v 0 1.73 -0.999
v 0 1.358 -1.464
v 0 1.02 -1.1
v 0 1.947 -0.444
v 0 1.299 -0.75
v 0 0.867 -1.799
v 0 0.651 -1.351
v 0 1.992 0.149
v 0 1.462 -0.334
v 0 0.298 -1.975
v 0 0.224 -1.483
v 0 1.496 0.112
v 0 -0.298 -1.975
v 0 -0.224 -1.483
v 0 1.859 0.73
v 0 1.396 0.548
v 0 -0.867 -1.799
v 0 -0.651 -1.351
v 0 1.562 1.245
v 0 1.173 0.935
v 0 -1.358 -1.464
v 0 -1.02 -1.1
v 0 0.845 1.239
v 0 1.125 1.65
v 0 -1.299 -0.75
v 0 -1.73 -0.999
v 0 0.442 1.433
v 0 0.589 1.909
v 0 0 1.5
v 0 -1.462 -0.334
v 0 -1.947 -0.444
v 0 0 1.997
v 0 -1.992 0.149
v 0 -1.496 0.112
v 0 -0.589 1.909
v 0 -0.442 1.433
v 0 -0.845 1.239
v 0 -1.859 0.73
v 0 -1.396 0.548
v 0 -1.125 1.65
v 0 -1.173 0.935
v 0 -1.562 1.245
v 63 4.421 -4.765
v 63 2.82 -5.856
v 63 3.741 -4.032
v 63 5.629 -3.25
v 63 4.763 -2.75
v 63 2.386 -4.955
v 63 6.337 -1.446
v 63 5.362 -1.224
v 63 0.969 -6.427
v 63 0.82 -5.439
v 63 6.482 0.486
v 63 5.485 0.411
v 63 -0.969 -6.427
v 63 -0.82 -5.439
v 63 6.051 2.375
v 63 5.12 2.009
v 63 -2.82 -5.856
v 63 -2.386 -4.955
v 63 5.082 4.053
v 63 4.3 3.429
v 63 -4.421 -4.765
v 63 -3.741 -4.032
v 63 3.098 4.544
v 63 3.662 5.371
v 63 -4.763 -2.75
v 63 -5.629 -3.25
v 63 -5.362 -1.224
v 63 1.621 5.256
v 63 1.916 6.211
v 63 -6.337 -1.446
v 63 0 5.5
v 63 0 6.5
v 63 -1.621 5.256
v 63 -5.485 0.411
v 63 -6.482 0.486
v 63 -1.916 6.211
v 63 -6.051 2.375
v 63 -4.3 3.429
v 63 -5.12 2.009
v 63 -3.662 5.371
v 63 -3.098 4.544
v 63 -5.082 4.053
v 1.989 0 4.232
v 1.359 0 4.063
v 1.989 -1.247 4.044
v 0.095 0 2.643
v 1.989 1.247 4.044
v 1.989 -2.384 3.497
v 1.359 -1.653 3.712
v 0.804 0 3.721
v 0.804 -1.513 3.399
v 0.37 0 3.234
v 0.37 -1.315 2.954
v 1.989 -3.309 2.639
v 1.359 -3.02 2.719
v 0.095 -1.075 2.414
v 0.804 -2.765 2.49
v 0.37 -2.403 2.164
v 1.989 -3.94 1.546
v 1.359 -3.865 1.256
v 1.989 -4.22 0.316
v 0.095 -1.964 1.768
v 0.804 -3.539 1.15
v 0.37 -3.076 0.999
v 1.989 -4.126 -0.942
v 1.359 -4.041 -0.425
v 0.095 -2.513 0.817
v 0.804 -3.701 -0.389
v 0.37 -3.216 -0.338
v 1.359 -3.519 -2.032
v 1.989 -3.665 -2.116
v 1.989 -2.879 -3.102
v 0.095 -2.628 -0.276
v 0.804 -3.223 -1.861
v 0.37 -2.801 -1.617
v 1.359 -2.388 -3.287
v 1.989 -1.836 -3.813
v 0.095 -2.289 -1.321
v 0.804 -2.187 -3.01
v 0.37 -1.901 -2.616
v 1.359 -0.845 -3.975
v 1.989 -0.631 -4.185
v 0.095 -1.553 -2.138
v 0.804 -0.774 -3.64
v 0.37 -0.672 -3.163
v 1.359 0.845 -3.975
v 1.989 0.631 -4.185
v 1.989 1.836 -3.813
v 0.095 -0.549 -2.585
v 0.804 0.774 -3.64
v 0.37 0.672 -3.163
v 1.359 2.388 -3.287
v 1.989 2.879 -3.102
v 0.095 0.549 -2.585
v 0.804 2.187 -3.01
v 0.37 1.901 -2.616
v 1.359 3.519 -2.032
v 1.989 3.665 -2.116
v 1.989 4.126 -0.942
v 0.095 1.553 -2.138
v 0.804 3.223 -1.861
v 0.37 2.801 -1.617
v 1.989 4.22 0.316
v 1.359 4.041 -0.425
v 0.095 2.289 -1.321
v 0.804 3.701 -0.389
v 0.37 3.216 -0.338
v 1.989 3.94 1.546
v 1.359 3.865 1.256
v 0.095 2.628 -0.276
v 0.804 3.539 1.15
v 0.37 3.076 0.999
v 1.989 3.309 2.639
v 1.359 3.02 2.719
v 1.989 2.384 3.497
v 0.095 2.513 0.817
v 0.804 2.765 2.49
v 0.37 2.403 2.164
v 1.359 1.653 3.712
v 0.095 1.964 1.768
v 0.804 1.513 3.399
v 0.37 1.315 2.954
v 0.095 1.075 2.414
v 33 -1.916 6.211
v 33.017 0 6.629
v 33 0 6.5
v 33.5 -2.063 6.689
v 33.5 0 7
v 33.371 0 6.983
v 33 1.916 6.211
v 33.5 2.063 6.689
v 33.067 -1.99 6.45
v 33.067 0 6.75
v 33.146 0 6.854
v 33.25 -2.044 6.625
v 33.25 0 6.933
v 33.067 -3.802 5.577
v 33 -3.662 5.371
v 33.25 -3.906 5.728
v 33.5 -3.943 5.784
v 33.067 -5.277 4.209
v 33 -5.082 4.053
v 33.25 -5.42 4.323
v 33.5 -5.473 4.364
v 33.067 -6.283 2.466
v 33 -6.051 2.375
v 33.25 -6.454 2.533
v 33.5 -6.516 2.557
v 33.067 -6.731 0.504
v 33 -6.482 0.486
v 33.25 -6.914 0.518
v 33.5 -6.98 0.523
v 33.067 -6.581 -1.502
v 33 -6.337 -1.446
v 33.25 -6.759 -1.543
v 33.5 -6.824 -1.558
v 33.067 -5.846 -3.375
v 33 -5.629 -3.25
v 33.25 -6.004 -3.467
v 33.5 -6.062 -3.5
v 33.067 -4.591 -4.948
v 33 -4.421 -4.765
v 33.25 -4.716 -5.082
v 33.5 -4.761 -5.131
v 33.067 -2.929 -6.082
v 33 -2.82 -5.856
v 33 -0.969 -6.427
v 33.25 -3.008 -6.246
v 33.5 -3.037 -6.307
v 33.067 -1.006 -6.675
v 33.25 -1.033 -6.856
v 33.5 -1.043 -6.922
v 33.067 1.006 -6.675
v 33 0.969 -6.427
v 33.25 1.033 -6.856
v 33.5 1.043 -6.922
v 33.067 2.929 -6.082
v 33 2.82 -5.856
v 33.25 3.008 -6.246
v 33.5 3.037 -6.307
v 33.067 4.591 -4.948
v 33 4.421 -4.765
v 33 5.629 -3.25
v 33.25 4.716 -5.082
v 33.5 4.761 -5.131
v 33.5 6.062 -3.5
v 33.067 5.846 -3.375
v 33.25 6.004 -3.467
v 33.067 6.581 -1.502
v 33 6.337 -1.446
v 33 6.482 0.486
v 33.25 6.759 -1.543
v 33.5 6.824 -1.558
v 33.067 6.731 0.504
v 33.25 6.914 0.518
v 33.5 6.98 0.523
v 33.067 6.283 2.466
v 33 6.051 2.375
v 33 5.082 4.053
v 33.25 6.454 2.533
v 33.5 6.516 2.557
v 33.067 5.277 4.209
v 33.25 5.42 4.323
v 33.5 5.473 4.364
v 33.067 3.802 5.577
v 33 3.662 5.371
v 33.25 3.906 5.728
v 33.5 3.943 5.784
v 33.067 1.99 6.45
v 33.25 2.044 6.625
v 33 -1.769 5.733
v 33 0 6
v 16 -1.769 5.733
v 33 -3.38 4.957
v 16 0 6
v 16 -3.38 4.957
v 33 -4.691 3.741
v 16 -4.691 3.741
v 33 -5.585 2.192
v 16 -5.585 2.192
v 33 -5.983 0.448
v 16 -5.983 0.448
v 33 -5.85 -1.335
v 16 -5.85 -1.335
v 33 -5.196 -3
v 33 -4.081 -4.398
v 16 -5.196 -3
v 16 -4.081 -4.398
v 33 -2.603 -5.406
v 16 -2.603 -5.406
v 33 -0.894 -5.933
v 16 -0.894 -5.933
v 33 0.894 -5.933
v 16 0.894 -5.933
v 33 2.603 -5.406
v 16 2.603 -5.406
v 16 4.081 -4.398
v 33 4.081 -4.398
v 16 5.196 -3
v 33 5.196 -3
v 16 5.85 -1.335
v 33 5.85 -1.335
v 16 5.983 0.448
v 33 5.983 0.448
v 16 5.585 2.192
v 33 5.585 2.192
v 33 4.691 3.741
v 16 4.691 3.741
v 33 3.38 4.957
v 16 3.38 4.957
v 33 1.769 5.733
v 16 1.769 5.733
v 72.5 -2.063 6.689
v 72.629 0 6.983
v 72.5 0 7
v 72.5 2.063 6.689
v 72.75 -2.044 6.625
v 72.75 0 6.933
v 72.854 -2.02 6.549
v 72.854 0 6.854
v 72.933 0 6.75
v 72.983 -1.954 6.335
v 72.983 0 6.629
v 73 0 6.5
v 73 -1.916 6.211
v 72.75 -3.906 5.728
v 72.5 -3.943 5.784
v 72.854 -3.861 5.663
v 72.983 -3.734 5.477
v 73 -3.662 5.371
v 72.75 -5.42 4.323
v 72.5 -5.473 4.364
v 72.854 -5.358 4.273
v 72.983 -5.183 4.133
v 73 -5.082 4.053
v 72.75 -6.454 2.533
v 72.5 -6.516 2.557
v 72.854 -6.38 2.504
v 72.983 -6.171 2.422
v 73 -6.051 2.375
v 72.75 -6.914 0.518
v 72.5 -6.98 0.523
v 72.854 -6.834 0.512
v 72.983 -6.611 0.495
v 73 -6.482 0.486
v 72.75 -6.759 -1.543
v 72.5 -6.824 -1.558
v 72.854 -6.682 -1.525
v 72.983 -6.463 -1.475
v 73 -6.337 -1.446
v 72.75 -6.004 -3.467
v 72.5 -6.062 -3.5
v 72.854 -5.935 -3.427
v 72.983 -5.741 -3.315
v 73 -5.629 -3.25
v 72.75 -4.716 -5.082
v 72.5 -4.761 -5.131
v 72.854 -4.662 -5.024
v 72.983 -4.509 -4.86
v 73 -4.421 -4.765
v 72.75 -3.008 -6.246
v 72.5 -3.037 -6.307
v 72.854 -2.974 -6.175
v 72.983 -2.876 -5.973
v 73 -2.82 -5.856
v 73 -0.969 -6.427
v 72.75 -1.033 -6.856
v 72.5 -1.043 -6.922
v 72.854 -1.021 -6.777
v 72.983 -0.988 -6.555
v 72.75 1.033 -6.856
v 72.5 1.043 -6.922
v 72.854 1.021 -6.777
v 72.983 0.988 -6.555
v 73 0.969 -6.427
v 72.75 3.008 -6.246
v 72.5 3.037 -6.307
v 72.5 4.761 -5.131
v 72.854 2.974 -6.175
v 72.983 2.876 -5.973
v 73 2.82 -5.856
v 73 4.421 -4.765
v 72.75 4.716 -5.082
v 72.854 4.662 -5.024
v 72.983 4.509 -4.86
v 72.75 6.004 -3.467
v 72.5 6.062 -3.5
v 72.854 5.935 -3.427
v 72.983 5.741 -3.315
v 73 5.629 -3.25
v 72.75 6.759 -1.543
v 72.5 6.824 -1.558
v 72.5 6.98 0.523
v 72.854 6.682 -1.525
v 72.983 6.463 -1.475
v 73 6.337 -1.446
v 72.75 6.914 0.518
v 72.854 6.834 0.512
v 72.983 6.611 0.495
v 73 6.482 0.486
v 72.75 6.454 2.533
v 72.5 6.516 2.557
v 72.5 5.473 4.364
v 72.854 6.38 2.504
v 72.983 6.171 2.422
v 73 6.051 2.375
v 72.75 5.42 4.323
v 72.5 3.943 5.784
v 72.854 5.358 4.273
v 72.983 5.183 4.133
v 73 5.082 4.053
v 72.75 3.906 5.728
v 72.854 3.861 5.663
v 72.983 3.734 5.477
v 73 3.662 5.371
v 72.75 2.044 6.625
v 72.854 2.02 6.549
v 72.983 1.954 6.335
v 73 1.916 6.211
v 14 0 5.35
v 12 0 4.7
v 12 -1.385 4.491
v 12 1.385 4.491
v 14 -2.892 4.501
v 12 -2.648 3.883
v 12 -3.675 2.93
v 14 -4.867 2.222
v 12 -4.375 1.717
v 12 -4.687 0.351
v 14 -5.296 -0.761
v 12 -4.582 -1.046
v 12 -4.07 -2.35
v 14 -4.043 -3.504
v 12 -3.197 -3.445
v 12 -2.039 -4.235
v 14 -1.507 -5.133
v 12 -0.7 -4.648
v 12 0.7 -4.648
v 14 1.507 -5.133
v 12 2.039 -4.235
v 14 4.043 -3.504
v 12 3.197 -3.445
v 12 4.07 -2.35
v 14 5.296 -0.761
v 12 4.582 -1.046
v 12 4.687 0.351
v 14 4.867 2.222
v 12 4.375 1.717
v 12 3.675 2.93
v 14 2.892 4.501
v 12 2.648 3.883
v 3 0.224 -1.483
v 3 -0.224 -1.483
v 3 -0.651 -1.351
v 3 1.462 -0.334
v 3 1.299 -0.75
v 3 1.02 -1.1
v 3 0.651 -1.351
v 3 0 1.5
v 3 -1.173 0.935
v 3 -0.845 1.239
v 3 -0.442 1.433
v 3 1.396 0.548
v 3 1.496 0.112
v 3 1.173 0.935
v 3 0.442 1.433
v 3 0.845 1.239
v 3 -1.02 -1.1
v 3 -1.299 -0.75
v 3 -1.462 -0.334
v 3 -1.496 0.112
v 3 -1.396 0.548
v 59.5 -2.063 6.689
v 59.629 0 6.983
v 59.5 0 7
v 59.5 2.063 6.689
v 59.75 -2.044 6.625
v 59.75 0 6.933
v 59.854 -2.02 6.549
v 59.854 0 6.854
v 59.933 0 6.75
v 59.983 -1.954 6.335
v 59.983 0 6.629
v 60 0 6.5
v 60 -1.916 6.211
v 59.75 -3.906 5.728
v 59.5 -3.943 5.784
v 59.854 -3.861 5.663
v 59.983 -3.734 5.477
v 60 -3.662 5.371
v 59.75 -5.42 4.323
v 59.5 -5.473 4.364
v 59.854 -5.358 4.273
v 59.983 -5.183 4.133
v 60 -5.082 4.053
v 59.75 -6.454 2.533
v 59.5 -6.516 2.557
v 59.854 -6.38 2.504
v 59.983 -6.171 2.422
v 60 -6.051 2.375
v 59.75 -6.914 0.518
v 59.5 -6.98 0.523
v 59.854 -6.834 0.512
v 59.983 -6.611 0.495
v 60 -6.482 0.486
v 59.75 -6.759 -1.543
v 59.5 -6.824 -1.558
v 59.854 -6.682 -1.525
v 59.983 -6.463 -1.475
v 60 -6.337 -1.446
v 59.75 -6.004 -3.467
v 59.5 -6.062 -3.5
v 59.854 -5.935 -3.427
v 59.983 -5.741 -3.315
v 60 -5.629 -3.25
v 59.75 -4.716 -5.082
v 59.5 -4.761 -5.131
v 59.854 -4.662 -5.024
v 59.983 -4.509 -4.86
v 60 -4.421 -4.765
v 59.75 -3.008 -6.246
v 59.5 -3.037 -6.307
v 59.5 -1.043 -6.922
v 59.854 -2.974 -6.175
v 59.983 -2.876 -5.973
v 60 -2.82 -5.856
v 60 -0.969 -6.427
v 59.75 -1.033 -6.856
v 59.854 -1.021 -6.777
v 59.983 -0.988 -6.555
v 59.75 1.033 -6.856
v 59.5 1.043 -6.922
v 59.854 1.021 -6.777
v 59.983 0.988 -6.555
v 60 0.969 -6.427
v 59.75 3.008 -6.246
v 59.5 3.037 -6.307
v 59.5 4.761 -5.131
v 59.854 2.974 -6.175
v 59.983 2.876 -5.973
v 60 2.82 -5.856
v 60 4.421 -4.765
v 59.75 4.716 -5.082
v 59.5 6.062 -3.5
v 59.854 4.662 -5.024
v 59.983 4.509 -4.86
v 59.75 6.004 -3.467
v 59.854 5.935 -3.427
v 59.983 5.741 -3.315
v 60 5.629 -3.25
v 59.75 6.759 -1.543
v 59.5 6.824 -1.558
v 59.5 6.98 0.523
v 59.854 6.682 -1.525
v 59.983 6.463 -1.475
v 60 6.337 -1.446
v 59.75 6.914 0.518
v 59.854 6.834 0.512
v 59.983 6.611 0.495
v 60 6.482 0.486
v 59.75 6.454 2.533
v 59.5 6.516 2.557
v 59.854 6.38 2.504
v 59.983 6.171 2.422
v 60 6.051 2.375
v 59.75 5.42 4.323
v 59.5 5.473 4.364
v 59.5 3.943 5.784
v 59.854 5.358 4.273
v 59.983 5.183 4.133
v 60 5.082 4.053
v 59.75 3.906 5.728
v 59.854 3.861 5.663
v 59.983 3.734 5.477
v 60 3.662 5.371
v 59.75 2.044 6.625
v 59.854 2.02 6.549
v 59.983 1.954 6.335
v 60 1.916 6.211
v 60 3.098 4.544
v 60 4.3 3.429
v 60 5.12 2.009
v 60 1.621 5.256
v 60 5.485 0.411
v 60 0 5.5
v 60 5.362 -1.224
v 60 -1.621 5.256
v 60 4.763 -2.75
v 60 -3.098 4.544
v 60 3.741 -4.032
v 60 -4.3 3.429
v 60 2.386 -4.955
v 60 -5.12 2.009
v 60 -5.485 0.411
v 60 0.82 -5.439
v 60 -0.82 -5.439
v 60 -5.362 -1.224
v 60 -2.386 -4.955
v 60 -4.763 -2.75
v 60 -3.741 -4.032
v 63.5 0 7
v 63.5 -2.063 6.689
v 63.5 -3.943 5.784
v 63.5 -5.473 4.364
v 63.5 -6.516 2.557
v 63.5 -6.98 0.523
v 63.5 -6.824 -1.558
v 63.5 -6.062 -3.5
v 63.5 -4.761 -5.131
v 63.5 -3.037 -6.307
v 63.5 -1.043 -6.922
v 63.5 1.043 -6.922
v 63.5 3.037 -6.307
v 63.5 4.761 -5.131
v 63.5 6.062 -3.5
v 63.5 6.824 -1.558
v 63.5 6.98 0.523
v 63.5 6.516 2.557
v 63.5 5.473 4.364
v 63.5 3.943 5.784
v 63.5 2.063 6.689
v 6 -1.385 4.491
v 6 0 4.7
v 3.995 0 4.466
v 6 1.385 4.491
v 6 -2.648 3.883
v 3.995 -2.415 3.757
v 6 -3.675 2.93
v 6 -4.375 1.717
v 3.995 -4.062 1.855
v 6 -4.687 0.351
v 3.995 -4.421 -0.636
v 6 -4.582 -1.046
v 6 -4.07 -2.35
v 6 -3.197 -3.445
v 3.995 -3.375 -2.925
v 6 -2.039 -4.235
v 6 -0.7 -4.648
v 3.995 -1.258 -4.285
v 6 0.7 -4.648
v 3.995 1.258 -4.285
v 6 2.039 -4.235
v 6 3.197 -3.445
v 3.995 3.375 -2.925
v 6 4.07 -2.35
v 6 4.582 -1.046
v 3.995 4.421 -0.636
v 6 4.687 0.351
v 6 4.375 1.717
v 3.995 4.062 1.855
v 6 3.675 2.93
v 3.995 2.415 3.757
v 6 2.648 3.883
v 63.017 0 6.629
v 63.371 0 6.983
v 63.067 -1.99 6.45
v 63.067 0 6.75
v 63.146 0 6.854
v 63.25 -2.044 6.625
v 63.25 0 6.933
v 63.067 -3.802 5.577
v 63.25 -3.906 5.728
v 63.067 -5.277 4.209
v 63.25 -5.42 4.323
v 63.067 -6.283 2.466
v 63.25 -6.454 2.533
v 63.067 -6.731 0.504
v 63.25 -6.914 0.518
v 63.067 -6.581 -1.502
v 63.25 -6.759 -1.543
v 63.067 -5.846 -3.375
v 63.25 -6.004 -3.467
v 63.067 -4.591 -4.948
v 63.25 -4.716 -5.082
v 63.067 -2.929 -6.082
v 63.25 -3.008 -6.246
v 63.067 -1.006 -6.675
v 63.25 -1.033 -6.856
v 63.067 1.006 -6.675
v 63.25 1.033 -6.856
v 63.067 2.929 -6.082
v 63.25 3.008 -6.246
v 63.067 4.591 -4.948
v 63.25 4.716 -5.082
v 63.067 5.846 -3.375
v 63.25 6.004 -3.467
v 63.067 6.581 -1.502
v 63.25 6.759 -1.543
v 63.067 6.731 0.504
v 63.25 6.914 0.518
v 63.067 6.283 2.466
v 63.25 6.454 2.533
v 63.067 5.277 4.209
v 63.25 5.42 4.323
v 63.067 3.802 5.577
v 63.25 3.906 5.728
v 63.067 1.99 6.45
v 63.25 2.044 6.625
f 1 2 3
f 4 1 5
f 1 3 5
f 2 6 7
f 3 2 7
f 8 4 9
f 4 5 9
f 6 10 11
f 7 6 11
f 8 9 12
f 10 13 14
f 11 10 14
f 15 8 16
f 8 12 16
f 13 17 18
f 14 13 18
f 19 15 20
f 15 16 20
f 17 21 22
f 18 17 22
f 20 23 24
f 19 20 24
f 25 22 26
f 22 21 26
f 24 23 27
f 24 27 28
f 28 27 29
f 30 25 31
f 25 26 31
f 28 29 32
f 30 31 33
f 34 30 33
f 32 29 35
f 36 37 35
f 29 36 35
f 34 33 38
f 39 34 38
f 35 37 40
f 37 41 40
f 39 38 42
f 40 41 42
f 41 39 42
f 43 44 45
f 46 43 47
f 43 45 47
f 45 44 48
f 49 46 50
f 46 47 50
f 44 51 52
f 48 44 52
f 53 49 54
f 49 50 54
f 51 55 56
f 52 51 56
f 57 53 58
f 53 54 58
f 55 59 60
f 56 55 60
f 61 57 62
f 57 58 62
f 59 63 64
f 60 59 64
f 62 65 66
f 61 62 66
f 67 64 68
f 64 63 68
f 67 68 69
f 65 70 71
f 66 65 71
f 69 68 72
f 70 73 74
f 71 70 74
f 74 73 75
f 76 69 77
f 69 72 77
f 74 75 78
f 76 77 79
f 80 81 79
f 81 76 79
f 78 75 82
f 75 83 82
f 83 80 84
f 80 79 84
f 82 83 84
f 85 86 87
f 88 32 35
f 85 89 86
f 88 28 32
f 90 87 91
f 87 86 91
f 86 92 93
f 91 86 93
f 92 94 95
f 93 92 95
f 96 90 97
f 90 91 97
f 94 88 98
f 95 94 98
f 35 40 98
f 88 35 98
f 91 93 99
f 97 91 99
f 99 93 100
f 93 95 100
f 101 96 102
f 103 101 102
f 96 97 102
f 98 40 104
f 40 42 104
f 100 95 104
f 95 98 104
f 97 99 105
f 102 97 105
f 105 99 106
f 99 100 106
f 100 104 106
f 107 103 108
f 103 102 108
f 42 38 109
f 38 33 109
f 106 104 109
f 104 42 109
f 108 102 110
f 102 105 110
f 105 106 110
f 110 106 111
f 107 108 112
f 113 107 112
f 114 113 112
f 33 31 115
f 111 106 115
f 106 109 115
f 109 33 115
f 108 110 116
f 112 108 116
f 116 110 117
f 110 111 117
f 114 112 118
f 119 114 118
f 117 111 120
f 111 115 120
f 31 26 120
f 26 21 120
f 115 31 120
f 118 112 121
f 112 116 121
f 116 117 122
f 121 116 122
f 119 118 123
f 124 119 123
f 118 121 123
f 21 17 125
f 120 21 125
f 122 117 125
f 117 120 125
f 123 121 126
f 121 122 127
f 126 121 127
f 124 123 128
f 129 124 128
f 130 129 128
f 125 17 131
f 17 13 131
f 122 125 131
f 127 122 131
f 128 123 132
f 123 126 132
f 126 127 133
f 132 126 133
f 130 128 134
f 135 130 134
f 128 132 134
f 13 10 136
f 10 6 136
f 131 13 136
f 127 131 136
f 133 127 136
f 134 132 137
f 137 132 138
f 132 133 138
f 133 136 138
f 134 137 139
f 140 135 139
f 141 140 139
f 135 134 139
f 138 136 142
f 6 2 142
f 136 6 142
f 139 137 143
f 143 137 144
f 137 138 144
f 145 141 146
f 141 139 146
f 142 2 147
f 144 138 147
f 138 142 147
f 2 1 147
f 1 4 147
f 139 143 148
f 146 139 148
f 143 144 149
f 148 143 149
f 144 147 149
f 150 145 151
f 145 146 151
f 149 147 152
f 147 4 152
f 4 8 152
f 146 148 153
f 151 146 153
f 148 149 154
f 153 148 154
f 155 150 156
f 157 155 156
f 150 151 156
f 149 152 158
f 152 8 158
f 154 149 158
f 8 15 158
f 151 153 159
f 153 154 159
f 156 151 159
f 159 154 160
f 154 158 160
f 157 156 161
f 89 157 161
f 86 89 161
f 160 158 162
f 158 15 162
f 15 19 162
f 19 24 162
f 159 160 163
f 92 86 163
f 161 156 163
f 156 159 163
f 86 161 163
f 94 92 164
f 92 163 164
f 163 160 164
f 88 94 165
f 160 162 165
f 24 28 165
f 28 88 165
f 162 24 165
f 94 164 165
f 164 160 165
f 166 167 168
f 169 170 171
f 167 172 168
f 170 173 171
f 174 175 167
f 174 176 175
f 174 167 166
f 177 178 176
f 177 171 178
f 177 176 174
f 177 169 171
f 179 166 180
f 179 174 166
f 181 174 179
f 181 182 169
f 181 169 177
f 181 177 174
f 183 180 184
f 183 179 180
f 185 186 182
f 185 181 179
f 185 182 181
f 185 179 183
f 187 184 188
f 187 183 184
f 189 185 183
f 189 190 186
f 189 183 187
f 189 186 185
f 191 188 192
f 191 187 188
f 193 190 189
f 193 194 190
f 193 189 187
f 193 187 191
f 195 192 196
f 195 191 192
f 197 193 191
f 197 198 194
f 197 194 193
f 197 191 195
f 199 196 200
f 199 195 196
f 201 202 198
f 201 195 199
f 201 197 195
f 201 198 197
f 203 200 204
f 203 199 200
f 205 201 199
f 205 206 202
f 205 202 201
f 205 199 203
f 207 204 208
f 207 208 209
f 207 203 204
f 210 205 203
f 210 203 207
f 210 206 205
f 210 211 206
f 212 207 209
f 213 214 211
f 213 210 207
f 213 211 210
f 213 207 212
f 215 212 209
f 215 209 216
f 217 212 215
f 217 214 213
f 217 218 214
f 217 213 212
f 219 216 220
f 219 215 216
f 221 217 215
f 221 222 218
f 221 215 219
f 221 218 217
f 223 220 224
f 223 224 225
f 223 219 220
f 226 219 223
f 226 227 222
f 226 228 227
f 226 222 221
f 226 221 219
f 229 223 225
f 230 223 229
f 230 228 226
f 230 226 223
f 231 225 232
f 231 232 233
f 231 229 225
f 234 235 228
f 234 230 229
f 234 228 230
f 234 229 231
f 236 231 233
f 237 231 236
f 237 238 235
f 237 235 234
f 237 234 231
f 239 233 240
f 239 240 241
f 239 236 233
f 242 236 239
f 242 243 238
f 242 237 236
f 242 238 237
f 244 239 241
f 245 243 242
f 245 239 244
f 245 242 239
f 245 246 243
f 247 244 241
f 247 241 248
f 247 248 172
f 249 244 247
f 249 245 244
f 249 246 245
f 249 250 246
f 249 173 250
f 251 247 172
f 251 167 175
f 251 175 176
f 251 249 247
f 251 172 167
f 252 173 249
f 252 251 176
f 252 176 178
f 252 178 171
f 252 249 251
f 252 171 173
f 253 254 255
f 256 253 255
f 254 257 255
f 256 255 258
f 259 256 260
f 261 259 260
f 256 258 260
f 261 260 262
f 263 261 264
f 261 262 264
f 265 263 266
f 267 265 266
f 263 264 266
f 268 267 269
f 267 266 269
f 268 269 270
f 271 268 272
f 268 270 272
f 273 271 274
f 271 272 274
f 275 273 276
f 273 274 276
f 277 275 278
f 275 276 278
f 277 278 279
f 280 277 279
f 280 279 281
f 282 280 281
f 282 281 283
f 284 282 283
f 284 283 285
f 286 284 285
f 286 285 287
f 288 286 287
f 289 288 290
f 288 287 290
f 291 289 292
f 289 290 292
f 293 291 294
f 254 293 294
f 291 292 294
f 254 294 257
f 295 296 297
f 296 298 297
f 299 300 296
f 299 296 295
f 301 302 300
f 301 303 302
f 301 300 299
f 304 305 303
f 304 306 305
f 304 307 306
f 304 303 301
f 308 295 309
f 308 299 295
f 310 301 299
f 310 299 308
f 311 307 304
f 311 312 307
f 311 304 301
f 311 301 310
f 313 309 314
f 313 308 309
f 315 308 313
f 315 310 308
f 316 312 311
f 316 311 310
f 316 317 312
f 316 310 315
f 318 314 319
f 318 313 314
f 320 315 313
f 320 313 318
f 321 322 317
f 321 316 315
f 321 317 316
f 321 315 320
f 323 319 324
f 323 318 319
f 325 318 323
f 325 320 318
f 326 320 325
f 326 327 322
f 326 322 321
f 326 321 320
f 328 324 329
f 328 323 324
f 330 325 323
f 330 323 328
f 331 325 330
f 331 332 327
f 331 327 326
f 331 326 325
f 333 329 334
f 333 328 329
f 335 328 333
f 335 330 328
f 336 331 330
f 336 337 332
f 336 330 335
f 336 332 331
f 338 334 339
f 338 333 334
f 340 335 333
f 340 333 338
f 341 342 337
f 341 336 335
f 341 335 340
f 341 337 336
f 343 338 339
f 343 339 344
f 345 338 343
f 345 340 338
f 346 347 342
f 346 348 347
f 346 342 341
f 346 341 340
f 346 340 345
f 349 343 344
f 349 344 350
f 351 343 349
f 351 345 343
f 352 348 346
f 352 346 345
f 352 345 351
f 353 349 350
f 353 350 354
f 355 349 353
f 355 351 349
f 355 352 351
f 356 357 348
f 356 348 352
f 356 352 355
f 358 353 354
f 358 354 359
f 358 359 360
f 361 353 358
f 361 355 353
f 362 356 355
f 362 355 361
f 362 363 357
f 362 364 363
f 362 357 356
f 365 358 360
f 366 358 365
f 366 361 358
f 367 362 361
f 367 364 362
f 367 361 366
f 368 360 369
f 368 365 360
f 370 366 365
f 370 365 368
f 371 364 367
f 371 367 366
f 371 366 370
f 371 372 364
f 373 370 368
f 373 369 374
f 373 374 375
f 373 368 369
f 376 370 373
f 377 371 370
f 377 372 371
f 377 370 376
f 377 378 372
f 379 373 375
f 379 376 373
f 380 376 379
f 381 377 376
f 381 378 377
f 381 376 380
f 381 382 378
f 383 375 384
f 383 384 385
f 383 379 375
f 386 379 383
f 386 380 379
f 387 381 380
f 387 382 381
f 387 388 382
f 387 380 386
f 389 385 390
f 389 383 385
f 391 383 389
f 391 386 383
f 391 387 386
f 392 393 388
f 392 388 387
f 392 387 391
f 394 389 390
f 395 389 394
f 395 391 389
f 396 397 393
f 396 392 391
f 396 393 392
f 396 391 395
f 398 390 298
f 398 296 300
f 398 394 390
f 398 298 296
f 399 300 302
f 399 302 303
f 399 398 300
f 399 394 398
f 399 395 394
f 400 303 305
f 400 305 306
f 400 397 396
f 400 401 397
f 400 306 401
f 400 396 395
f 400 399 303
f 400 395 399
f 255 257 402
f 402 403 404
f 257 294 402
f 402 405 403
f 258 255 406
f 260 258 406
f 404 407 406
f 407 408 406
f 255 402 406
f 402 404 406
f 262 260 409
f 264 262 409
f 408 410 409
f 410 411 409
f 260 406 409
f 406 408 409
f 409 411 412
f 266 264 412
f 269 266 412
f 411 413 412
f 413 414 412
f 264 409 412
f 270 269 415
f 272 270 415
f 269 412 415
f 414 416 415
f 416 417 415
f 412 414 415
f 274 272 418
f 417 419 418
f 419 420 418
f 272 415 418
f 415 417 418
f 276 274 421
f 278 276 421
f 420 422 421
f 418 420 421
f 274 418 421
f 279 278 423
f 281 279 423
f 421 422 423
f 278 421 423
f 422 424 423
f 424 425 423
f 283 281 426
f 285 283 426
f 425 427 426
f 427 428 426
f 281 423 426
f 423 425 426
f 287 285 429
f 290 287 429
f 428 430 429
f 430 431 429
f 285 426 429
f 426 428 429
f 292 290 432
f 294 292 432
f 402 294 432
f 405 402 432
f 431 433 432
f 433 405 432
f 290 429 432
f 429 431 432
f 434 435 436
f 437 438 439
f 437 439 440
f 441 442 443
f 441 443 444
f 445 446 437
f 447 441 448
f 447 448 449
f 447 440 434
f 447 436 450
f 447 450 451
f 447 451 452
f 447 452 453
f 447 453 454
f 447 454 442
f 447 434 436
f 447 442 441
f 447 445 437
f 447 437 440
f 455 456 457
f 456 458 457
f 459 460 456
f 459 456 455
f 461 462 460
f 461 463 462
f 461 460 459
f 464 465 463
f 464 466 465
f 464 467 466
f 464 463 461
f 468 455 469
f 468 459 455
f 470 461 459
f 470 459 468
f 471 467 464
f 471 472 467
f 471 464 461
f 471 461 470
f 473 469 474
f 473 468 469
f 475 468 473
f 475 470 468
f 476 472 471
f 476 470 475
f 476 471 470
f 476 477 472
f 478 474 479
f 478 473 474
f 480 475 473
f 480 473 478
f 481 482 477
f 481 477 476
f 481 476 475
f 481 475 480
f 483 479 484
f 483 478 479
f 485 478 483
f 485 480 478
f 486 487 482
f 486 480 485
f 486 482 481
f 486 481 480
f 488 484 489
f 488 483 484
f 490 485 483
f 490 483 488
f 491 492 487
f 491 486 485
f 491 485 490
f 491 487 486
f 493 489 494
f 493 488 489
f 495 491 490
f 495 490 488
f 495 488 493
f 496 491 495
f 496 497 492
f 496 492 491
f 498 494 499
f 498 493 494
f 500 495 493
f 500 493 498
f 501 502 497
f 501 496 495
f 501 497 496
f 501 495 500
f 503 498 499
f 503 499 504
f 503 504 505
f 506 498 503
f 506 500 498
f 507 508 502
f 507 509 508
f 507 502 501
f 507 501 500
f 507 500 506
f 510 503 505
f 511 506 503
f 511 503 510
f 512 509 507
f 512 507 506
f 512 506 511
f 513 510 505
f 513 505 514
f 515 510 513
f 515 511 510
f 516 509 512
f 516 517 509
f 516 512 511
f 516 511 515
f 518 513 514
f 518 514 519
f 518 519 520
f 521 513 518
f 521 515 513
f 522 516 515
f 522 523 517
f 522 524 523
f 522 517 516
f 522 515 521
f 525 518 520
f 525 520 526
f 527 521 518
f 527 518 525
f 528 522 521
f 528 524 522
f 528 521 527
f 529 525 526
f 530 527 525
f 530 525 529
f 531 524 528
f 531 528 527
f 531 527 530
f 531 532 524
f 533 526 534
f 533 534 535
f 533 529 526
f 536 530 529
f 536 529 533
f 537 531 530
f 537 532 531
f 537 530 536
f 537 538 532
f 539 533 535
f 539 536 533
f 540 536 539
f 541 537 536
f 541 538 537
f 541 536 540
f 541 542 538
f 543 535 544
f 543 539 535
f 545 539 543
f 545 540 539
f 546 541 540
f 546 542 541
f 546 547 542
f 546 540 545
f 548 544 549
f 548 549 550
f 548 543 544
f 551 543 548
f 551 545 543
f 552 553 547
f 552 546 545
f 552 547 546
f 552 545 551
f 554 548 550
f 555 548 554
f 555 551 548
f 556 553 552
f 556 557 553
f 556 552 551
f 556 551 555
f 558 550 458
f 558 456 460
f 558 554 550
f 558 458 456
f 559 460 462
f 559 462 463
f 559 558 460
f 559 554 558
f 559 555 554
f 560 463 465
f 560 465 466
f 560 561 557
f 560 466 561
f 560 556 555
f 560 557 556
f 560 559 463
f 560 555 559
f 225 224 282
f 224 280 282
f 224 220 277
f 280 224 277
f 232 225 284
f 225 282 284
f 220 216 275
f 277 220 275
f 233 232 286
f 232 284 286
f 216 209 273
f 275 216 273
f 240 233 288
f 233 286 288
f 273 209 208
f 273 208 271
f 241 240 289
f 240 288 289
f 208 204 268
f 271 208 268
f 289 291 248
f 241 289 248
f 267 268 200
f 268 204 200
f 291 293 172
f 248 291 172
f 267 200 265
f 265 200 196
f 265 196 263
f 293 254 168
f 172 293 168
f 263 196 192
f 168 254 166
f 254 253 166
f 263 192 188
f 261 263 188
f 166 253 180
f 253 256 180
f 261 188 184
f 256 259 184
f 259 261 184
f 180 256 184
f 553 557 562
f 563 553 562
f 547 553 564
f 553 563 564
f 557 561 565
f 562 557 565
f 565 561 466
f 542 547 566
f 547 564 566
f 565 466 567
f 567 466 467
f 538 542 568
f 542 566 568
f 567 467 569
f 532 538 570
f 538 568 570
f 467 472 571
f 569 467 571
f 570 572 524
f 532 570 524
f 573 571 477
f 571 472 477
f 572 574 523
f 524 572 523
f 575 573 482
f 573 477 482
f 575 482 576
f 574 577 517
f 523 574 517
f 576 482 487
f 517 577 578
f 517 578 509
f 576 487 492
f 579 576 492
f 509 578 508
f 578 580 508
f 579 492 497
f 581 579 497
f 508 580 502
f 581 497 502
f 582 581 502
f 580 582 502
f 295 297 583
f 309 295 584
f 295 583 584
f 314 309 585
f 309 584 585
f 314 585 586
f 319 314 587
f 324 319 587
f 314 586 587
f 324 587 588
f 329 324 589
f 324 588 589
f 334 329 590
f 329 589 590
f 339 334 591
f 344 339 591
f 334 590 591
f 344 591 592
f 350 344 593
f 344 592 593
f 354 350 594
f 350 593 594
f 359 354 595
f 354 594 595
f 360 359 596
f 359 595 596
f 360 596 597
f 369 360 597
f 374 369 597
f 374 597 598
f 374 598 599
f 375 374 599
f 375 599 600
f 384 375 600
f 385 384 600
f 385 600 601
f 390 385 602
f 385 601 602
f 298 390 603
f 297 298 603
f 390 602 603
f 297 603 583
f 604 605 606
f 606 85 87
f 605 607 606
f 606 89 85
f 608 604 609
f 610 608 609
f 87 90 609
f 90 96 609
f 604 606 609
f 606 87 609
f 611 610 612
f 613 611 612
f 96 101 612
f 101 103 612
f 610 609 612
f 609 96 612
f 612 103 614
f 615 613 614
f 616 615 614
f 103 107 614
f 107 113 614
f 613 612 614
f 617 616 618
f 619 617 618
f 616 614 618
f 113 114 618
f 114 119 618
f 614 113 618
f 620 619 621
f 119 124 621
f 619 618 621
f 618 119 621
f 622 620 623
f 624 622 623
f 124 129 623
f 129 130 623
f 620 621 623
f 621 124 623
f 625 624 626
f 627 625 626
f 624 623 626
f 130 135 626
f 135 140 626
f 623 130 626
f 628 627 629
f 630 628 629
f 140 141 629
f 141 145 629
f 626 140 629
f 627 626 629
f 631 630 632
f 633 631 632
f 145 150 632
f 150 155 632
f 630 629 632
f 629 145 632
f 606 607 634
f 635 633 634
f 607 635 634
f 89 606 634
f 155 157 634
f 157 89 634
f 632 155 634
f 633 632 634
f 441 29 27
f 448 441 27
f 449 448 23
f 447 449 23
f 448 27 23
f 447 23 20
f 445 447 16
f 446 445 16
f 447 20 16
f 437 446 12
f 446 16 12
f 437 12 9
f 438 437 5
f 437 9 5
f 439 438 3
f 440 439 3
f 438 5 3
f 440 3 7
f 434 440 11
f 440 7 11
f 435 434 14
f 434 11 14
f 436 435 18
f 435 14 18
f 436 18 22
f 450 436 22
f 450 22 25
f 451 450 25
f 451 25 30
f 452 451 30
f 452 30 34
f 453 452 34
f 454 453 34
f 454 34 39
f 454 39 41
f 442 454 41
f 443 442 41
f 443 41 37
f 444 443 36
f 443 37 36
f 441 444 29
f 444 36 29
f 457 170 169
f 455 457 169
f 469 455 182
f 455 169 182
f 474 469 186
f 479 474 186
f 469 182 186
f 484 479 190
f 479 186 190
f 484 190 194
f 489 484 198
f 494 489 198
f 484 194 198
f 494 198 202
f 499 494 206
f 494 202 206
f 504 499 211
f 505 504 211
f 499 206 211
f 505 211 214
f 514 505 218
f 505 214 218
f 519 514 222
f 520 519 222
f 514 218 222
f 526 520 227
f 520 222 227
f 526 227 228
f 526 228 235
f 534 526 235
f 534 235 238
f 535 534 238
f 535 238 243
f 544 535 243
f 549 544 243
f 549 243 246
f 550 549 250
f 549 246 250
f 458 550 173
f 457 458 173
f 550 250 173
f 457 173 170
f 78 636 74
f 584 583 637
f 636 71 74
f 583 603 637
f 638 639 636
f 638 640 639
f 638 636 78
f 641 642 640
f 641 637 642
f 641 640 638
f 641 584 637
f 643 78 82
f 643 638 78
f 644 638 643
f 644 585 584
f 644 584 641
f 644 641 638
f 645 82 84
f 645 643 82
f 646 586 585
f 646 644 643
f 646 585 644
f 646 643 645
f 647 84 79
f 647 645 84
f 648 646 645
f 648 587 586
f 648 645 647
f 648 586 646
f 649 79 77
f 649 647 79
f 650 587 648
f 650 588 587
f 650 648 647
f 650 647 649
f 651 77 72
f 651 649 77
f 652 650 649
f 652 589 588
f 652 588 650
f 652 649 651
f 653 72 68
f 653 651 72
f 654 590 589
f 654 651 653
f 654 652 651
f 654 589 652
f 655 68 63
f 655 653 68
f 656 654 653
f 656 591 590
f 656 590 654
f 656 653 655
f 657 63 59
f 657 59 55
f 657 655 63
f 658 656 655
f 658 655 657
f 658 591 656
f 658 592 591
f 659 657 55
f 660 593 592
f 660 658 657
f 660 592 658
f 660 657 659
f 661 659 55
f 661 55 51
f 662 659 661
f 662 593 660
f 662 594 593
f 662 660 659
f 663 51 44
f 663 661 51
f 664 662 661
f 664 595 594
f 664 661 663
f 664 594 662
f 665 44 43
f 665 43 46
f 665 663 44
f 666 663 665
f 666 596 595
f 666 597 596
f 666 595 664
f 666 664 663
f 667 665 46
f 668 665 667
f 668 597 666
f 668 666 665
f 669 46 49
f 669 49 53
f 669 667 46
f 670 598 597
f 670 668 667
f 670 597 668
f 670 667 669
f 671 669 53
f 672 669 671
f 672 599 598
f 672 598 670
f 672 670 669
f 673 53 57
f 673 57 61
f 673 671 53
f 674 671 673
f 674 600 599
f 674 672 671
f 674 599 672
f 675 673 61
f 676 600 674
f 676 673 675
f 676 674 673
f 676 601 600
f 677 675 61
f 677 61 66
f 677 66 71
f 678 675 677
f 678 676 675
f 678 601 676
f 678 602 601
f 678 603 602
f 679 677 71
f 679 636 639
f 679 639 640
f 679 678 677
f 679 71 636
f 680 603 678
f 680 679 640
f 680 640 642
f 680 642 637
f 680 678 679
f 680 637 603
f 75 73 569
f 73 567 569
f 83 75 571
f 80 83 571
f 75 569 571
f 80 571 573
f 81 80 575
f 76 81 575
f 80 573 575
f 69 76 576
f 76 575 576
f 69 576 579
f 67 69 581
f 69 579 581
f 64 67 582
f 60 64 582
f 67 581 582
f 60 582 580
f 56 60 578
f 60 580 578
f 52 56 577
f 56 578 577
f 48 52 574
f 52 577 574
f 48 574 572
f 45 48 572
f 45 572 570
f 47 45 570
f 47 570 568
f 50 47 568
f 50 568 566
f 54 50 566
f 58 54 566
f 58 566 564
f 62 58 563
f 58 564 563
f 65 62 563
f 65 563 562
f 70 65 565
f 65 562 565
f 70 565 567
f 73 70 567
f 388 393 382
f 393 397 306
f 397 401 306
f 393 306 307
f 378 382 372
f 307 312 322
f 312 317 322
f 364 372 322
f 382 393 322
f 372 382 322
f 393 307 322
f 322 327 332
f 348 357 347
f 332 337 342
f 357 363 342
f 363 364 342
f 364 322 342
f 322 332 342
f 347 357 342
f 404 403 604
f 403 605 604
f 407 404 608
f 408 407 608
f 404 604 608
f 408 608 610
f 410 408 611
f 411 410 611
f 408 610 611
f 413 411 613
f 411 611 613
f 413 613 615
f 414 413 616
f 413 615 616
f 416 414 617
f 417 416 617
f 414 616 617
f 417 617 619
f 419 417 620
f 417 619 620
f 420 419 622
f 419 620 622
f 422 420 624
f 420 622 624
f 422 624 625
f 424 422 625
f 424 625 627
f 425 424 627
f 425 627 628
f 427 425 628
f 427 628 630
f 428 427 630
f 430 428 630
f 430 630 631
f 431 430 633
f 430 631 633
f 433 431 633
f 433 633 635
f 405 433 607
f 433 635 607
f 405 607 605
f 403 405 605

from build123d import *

# Parameters (mm, degrees)
ESBO_O2_R             = 1.5
CORTE_EXTRUS_O1_DEPTH = 3
FILETE1_R             = 2.25
FILETE2_R             = 0.5


with BuildPart() as part:
    # Esboço1 → Revolução1 (revolve)
    with BuildSketch(Plane.XY, mode=Mode.PRIVATE) as revolu_o1_sk:
        Polygon((0, 0), (73, 0), (73, 7), (63, 7), (63, 5.5), (60, 5.5), (60, 7), (33, 7), (33, 6), (16, 6), (12, 4.7), (6, 4.7), (0, 4), align=None)
    revolve(revolu_o1_sk.sketch.rotate(Axis((0, 0, 0), (1, 0, 0)), 90), axis=Axis((0, 0, 0), (1, 0, 0)))

    # Esboço2 → Corte-extrusão1 (cut)
    with BuildSketch(Plane.ZY):
        Circle(ESBO_O2_R)
    extrude(amount=-CORTE_EXTRUS_O1_DEPTH, mode=Mode.SUBTRACT)

    # Filete1
    filete1_edges = [part.edges().sort_by_distance(p)[0] for p in [
        (0, 0, -4),
    ]]
    fillet(filete1_edges, radius=FILETE1_R)

    # Filete2
    filete2_edges = [part.edges().sort_by_distance(p)[0] for p in [
        (33, 0, -7),
        (60, 0, -7),
        (63, 0, -7),
        (73, 0, -7),
    ]]
    fillet(filete2_edges, radius=FILETE2_R)


solid = part.part
